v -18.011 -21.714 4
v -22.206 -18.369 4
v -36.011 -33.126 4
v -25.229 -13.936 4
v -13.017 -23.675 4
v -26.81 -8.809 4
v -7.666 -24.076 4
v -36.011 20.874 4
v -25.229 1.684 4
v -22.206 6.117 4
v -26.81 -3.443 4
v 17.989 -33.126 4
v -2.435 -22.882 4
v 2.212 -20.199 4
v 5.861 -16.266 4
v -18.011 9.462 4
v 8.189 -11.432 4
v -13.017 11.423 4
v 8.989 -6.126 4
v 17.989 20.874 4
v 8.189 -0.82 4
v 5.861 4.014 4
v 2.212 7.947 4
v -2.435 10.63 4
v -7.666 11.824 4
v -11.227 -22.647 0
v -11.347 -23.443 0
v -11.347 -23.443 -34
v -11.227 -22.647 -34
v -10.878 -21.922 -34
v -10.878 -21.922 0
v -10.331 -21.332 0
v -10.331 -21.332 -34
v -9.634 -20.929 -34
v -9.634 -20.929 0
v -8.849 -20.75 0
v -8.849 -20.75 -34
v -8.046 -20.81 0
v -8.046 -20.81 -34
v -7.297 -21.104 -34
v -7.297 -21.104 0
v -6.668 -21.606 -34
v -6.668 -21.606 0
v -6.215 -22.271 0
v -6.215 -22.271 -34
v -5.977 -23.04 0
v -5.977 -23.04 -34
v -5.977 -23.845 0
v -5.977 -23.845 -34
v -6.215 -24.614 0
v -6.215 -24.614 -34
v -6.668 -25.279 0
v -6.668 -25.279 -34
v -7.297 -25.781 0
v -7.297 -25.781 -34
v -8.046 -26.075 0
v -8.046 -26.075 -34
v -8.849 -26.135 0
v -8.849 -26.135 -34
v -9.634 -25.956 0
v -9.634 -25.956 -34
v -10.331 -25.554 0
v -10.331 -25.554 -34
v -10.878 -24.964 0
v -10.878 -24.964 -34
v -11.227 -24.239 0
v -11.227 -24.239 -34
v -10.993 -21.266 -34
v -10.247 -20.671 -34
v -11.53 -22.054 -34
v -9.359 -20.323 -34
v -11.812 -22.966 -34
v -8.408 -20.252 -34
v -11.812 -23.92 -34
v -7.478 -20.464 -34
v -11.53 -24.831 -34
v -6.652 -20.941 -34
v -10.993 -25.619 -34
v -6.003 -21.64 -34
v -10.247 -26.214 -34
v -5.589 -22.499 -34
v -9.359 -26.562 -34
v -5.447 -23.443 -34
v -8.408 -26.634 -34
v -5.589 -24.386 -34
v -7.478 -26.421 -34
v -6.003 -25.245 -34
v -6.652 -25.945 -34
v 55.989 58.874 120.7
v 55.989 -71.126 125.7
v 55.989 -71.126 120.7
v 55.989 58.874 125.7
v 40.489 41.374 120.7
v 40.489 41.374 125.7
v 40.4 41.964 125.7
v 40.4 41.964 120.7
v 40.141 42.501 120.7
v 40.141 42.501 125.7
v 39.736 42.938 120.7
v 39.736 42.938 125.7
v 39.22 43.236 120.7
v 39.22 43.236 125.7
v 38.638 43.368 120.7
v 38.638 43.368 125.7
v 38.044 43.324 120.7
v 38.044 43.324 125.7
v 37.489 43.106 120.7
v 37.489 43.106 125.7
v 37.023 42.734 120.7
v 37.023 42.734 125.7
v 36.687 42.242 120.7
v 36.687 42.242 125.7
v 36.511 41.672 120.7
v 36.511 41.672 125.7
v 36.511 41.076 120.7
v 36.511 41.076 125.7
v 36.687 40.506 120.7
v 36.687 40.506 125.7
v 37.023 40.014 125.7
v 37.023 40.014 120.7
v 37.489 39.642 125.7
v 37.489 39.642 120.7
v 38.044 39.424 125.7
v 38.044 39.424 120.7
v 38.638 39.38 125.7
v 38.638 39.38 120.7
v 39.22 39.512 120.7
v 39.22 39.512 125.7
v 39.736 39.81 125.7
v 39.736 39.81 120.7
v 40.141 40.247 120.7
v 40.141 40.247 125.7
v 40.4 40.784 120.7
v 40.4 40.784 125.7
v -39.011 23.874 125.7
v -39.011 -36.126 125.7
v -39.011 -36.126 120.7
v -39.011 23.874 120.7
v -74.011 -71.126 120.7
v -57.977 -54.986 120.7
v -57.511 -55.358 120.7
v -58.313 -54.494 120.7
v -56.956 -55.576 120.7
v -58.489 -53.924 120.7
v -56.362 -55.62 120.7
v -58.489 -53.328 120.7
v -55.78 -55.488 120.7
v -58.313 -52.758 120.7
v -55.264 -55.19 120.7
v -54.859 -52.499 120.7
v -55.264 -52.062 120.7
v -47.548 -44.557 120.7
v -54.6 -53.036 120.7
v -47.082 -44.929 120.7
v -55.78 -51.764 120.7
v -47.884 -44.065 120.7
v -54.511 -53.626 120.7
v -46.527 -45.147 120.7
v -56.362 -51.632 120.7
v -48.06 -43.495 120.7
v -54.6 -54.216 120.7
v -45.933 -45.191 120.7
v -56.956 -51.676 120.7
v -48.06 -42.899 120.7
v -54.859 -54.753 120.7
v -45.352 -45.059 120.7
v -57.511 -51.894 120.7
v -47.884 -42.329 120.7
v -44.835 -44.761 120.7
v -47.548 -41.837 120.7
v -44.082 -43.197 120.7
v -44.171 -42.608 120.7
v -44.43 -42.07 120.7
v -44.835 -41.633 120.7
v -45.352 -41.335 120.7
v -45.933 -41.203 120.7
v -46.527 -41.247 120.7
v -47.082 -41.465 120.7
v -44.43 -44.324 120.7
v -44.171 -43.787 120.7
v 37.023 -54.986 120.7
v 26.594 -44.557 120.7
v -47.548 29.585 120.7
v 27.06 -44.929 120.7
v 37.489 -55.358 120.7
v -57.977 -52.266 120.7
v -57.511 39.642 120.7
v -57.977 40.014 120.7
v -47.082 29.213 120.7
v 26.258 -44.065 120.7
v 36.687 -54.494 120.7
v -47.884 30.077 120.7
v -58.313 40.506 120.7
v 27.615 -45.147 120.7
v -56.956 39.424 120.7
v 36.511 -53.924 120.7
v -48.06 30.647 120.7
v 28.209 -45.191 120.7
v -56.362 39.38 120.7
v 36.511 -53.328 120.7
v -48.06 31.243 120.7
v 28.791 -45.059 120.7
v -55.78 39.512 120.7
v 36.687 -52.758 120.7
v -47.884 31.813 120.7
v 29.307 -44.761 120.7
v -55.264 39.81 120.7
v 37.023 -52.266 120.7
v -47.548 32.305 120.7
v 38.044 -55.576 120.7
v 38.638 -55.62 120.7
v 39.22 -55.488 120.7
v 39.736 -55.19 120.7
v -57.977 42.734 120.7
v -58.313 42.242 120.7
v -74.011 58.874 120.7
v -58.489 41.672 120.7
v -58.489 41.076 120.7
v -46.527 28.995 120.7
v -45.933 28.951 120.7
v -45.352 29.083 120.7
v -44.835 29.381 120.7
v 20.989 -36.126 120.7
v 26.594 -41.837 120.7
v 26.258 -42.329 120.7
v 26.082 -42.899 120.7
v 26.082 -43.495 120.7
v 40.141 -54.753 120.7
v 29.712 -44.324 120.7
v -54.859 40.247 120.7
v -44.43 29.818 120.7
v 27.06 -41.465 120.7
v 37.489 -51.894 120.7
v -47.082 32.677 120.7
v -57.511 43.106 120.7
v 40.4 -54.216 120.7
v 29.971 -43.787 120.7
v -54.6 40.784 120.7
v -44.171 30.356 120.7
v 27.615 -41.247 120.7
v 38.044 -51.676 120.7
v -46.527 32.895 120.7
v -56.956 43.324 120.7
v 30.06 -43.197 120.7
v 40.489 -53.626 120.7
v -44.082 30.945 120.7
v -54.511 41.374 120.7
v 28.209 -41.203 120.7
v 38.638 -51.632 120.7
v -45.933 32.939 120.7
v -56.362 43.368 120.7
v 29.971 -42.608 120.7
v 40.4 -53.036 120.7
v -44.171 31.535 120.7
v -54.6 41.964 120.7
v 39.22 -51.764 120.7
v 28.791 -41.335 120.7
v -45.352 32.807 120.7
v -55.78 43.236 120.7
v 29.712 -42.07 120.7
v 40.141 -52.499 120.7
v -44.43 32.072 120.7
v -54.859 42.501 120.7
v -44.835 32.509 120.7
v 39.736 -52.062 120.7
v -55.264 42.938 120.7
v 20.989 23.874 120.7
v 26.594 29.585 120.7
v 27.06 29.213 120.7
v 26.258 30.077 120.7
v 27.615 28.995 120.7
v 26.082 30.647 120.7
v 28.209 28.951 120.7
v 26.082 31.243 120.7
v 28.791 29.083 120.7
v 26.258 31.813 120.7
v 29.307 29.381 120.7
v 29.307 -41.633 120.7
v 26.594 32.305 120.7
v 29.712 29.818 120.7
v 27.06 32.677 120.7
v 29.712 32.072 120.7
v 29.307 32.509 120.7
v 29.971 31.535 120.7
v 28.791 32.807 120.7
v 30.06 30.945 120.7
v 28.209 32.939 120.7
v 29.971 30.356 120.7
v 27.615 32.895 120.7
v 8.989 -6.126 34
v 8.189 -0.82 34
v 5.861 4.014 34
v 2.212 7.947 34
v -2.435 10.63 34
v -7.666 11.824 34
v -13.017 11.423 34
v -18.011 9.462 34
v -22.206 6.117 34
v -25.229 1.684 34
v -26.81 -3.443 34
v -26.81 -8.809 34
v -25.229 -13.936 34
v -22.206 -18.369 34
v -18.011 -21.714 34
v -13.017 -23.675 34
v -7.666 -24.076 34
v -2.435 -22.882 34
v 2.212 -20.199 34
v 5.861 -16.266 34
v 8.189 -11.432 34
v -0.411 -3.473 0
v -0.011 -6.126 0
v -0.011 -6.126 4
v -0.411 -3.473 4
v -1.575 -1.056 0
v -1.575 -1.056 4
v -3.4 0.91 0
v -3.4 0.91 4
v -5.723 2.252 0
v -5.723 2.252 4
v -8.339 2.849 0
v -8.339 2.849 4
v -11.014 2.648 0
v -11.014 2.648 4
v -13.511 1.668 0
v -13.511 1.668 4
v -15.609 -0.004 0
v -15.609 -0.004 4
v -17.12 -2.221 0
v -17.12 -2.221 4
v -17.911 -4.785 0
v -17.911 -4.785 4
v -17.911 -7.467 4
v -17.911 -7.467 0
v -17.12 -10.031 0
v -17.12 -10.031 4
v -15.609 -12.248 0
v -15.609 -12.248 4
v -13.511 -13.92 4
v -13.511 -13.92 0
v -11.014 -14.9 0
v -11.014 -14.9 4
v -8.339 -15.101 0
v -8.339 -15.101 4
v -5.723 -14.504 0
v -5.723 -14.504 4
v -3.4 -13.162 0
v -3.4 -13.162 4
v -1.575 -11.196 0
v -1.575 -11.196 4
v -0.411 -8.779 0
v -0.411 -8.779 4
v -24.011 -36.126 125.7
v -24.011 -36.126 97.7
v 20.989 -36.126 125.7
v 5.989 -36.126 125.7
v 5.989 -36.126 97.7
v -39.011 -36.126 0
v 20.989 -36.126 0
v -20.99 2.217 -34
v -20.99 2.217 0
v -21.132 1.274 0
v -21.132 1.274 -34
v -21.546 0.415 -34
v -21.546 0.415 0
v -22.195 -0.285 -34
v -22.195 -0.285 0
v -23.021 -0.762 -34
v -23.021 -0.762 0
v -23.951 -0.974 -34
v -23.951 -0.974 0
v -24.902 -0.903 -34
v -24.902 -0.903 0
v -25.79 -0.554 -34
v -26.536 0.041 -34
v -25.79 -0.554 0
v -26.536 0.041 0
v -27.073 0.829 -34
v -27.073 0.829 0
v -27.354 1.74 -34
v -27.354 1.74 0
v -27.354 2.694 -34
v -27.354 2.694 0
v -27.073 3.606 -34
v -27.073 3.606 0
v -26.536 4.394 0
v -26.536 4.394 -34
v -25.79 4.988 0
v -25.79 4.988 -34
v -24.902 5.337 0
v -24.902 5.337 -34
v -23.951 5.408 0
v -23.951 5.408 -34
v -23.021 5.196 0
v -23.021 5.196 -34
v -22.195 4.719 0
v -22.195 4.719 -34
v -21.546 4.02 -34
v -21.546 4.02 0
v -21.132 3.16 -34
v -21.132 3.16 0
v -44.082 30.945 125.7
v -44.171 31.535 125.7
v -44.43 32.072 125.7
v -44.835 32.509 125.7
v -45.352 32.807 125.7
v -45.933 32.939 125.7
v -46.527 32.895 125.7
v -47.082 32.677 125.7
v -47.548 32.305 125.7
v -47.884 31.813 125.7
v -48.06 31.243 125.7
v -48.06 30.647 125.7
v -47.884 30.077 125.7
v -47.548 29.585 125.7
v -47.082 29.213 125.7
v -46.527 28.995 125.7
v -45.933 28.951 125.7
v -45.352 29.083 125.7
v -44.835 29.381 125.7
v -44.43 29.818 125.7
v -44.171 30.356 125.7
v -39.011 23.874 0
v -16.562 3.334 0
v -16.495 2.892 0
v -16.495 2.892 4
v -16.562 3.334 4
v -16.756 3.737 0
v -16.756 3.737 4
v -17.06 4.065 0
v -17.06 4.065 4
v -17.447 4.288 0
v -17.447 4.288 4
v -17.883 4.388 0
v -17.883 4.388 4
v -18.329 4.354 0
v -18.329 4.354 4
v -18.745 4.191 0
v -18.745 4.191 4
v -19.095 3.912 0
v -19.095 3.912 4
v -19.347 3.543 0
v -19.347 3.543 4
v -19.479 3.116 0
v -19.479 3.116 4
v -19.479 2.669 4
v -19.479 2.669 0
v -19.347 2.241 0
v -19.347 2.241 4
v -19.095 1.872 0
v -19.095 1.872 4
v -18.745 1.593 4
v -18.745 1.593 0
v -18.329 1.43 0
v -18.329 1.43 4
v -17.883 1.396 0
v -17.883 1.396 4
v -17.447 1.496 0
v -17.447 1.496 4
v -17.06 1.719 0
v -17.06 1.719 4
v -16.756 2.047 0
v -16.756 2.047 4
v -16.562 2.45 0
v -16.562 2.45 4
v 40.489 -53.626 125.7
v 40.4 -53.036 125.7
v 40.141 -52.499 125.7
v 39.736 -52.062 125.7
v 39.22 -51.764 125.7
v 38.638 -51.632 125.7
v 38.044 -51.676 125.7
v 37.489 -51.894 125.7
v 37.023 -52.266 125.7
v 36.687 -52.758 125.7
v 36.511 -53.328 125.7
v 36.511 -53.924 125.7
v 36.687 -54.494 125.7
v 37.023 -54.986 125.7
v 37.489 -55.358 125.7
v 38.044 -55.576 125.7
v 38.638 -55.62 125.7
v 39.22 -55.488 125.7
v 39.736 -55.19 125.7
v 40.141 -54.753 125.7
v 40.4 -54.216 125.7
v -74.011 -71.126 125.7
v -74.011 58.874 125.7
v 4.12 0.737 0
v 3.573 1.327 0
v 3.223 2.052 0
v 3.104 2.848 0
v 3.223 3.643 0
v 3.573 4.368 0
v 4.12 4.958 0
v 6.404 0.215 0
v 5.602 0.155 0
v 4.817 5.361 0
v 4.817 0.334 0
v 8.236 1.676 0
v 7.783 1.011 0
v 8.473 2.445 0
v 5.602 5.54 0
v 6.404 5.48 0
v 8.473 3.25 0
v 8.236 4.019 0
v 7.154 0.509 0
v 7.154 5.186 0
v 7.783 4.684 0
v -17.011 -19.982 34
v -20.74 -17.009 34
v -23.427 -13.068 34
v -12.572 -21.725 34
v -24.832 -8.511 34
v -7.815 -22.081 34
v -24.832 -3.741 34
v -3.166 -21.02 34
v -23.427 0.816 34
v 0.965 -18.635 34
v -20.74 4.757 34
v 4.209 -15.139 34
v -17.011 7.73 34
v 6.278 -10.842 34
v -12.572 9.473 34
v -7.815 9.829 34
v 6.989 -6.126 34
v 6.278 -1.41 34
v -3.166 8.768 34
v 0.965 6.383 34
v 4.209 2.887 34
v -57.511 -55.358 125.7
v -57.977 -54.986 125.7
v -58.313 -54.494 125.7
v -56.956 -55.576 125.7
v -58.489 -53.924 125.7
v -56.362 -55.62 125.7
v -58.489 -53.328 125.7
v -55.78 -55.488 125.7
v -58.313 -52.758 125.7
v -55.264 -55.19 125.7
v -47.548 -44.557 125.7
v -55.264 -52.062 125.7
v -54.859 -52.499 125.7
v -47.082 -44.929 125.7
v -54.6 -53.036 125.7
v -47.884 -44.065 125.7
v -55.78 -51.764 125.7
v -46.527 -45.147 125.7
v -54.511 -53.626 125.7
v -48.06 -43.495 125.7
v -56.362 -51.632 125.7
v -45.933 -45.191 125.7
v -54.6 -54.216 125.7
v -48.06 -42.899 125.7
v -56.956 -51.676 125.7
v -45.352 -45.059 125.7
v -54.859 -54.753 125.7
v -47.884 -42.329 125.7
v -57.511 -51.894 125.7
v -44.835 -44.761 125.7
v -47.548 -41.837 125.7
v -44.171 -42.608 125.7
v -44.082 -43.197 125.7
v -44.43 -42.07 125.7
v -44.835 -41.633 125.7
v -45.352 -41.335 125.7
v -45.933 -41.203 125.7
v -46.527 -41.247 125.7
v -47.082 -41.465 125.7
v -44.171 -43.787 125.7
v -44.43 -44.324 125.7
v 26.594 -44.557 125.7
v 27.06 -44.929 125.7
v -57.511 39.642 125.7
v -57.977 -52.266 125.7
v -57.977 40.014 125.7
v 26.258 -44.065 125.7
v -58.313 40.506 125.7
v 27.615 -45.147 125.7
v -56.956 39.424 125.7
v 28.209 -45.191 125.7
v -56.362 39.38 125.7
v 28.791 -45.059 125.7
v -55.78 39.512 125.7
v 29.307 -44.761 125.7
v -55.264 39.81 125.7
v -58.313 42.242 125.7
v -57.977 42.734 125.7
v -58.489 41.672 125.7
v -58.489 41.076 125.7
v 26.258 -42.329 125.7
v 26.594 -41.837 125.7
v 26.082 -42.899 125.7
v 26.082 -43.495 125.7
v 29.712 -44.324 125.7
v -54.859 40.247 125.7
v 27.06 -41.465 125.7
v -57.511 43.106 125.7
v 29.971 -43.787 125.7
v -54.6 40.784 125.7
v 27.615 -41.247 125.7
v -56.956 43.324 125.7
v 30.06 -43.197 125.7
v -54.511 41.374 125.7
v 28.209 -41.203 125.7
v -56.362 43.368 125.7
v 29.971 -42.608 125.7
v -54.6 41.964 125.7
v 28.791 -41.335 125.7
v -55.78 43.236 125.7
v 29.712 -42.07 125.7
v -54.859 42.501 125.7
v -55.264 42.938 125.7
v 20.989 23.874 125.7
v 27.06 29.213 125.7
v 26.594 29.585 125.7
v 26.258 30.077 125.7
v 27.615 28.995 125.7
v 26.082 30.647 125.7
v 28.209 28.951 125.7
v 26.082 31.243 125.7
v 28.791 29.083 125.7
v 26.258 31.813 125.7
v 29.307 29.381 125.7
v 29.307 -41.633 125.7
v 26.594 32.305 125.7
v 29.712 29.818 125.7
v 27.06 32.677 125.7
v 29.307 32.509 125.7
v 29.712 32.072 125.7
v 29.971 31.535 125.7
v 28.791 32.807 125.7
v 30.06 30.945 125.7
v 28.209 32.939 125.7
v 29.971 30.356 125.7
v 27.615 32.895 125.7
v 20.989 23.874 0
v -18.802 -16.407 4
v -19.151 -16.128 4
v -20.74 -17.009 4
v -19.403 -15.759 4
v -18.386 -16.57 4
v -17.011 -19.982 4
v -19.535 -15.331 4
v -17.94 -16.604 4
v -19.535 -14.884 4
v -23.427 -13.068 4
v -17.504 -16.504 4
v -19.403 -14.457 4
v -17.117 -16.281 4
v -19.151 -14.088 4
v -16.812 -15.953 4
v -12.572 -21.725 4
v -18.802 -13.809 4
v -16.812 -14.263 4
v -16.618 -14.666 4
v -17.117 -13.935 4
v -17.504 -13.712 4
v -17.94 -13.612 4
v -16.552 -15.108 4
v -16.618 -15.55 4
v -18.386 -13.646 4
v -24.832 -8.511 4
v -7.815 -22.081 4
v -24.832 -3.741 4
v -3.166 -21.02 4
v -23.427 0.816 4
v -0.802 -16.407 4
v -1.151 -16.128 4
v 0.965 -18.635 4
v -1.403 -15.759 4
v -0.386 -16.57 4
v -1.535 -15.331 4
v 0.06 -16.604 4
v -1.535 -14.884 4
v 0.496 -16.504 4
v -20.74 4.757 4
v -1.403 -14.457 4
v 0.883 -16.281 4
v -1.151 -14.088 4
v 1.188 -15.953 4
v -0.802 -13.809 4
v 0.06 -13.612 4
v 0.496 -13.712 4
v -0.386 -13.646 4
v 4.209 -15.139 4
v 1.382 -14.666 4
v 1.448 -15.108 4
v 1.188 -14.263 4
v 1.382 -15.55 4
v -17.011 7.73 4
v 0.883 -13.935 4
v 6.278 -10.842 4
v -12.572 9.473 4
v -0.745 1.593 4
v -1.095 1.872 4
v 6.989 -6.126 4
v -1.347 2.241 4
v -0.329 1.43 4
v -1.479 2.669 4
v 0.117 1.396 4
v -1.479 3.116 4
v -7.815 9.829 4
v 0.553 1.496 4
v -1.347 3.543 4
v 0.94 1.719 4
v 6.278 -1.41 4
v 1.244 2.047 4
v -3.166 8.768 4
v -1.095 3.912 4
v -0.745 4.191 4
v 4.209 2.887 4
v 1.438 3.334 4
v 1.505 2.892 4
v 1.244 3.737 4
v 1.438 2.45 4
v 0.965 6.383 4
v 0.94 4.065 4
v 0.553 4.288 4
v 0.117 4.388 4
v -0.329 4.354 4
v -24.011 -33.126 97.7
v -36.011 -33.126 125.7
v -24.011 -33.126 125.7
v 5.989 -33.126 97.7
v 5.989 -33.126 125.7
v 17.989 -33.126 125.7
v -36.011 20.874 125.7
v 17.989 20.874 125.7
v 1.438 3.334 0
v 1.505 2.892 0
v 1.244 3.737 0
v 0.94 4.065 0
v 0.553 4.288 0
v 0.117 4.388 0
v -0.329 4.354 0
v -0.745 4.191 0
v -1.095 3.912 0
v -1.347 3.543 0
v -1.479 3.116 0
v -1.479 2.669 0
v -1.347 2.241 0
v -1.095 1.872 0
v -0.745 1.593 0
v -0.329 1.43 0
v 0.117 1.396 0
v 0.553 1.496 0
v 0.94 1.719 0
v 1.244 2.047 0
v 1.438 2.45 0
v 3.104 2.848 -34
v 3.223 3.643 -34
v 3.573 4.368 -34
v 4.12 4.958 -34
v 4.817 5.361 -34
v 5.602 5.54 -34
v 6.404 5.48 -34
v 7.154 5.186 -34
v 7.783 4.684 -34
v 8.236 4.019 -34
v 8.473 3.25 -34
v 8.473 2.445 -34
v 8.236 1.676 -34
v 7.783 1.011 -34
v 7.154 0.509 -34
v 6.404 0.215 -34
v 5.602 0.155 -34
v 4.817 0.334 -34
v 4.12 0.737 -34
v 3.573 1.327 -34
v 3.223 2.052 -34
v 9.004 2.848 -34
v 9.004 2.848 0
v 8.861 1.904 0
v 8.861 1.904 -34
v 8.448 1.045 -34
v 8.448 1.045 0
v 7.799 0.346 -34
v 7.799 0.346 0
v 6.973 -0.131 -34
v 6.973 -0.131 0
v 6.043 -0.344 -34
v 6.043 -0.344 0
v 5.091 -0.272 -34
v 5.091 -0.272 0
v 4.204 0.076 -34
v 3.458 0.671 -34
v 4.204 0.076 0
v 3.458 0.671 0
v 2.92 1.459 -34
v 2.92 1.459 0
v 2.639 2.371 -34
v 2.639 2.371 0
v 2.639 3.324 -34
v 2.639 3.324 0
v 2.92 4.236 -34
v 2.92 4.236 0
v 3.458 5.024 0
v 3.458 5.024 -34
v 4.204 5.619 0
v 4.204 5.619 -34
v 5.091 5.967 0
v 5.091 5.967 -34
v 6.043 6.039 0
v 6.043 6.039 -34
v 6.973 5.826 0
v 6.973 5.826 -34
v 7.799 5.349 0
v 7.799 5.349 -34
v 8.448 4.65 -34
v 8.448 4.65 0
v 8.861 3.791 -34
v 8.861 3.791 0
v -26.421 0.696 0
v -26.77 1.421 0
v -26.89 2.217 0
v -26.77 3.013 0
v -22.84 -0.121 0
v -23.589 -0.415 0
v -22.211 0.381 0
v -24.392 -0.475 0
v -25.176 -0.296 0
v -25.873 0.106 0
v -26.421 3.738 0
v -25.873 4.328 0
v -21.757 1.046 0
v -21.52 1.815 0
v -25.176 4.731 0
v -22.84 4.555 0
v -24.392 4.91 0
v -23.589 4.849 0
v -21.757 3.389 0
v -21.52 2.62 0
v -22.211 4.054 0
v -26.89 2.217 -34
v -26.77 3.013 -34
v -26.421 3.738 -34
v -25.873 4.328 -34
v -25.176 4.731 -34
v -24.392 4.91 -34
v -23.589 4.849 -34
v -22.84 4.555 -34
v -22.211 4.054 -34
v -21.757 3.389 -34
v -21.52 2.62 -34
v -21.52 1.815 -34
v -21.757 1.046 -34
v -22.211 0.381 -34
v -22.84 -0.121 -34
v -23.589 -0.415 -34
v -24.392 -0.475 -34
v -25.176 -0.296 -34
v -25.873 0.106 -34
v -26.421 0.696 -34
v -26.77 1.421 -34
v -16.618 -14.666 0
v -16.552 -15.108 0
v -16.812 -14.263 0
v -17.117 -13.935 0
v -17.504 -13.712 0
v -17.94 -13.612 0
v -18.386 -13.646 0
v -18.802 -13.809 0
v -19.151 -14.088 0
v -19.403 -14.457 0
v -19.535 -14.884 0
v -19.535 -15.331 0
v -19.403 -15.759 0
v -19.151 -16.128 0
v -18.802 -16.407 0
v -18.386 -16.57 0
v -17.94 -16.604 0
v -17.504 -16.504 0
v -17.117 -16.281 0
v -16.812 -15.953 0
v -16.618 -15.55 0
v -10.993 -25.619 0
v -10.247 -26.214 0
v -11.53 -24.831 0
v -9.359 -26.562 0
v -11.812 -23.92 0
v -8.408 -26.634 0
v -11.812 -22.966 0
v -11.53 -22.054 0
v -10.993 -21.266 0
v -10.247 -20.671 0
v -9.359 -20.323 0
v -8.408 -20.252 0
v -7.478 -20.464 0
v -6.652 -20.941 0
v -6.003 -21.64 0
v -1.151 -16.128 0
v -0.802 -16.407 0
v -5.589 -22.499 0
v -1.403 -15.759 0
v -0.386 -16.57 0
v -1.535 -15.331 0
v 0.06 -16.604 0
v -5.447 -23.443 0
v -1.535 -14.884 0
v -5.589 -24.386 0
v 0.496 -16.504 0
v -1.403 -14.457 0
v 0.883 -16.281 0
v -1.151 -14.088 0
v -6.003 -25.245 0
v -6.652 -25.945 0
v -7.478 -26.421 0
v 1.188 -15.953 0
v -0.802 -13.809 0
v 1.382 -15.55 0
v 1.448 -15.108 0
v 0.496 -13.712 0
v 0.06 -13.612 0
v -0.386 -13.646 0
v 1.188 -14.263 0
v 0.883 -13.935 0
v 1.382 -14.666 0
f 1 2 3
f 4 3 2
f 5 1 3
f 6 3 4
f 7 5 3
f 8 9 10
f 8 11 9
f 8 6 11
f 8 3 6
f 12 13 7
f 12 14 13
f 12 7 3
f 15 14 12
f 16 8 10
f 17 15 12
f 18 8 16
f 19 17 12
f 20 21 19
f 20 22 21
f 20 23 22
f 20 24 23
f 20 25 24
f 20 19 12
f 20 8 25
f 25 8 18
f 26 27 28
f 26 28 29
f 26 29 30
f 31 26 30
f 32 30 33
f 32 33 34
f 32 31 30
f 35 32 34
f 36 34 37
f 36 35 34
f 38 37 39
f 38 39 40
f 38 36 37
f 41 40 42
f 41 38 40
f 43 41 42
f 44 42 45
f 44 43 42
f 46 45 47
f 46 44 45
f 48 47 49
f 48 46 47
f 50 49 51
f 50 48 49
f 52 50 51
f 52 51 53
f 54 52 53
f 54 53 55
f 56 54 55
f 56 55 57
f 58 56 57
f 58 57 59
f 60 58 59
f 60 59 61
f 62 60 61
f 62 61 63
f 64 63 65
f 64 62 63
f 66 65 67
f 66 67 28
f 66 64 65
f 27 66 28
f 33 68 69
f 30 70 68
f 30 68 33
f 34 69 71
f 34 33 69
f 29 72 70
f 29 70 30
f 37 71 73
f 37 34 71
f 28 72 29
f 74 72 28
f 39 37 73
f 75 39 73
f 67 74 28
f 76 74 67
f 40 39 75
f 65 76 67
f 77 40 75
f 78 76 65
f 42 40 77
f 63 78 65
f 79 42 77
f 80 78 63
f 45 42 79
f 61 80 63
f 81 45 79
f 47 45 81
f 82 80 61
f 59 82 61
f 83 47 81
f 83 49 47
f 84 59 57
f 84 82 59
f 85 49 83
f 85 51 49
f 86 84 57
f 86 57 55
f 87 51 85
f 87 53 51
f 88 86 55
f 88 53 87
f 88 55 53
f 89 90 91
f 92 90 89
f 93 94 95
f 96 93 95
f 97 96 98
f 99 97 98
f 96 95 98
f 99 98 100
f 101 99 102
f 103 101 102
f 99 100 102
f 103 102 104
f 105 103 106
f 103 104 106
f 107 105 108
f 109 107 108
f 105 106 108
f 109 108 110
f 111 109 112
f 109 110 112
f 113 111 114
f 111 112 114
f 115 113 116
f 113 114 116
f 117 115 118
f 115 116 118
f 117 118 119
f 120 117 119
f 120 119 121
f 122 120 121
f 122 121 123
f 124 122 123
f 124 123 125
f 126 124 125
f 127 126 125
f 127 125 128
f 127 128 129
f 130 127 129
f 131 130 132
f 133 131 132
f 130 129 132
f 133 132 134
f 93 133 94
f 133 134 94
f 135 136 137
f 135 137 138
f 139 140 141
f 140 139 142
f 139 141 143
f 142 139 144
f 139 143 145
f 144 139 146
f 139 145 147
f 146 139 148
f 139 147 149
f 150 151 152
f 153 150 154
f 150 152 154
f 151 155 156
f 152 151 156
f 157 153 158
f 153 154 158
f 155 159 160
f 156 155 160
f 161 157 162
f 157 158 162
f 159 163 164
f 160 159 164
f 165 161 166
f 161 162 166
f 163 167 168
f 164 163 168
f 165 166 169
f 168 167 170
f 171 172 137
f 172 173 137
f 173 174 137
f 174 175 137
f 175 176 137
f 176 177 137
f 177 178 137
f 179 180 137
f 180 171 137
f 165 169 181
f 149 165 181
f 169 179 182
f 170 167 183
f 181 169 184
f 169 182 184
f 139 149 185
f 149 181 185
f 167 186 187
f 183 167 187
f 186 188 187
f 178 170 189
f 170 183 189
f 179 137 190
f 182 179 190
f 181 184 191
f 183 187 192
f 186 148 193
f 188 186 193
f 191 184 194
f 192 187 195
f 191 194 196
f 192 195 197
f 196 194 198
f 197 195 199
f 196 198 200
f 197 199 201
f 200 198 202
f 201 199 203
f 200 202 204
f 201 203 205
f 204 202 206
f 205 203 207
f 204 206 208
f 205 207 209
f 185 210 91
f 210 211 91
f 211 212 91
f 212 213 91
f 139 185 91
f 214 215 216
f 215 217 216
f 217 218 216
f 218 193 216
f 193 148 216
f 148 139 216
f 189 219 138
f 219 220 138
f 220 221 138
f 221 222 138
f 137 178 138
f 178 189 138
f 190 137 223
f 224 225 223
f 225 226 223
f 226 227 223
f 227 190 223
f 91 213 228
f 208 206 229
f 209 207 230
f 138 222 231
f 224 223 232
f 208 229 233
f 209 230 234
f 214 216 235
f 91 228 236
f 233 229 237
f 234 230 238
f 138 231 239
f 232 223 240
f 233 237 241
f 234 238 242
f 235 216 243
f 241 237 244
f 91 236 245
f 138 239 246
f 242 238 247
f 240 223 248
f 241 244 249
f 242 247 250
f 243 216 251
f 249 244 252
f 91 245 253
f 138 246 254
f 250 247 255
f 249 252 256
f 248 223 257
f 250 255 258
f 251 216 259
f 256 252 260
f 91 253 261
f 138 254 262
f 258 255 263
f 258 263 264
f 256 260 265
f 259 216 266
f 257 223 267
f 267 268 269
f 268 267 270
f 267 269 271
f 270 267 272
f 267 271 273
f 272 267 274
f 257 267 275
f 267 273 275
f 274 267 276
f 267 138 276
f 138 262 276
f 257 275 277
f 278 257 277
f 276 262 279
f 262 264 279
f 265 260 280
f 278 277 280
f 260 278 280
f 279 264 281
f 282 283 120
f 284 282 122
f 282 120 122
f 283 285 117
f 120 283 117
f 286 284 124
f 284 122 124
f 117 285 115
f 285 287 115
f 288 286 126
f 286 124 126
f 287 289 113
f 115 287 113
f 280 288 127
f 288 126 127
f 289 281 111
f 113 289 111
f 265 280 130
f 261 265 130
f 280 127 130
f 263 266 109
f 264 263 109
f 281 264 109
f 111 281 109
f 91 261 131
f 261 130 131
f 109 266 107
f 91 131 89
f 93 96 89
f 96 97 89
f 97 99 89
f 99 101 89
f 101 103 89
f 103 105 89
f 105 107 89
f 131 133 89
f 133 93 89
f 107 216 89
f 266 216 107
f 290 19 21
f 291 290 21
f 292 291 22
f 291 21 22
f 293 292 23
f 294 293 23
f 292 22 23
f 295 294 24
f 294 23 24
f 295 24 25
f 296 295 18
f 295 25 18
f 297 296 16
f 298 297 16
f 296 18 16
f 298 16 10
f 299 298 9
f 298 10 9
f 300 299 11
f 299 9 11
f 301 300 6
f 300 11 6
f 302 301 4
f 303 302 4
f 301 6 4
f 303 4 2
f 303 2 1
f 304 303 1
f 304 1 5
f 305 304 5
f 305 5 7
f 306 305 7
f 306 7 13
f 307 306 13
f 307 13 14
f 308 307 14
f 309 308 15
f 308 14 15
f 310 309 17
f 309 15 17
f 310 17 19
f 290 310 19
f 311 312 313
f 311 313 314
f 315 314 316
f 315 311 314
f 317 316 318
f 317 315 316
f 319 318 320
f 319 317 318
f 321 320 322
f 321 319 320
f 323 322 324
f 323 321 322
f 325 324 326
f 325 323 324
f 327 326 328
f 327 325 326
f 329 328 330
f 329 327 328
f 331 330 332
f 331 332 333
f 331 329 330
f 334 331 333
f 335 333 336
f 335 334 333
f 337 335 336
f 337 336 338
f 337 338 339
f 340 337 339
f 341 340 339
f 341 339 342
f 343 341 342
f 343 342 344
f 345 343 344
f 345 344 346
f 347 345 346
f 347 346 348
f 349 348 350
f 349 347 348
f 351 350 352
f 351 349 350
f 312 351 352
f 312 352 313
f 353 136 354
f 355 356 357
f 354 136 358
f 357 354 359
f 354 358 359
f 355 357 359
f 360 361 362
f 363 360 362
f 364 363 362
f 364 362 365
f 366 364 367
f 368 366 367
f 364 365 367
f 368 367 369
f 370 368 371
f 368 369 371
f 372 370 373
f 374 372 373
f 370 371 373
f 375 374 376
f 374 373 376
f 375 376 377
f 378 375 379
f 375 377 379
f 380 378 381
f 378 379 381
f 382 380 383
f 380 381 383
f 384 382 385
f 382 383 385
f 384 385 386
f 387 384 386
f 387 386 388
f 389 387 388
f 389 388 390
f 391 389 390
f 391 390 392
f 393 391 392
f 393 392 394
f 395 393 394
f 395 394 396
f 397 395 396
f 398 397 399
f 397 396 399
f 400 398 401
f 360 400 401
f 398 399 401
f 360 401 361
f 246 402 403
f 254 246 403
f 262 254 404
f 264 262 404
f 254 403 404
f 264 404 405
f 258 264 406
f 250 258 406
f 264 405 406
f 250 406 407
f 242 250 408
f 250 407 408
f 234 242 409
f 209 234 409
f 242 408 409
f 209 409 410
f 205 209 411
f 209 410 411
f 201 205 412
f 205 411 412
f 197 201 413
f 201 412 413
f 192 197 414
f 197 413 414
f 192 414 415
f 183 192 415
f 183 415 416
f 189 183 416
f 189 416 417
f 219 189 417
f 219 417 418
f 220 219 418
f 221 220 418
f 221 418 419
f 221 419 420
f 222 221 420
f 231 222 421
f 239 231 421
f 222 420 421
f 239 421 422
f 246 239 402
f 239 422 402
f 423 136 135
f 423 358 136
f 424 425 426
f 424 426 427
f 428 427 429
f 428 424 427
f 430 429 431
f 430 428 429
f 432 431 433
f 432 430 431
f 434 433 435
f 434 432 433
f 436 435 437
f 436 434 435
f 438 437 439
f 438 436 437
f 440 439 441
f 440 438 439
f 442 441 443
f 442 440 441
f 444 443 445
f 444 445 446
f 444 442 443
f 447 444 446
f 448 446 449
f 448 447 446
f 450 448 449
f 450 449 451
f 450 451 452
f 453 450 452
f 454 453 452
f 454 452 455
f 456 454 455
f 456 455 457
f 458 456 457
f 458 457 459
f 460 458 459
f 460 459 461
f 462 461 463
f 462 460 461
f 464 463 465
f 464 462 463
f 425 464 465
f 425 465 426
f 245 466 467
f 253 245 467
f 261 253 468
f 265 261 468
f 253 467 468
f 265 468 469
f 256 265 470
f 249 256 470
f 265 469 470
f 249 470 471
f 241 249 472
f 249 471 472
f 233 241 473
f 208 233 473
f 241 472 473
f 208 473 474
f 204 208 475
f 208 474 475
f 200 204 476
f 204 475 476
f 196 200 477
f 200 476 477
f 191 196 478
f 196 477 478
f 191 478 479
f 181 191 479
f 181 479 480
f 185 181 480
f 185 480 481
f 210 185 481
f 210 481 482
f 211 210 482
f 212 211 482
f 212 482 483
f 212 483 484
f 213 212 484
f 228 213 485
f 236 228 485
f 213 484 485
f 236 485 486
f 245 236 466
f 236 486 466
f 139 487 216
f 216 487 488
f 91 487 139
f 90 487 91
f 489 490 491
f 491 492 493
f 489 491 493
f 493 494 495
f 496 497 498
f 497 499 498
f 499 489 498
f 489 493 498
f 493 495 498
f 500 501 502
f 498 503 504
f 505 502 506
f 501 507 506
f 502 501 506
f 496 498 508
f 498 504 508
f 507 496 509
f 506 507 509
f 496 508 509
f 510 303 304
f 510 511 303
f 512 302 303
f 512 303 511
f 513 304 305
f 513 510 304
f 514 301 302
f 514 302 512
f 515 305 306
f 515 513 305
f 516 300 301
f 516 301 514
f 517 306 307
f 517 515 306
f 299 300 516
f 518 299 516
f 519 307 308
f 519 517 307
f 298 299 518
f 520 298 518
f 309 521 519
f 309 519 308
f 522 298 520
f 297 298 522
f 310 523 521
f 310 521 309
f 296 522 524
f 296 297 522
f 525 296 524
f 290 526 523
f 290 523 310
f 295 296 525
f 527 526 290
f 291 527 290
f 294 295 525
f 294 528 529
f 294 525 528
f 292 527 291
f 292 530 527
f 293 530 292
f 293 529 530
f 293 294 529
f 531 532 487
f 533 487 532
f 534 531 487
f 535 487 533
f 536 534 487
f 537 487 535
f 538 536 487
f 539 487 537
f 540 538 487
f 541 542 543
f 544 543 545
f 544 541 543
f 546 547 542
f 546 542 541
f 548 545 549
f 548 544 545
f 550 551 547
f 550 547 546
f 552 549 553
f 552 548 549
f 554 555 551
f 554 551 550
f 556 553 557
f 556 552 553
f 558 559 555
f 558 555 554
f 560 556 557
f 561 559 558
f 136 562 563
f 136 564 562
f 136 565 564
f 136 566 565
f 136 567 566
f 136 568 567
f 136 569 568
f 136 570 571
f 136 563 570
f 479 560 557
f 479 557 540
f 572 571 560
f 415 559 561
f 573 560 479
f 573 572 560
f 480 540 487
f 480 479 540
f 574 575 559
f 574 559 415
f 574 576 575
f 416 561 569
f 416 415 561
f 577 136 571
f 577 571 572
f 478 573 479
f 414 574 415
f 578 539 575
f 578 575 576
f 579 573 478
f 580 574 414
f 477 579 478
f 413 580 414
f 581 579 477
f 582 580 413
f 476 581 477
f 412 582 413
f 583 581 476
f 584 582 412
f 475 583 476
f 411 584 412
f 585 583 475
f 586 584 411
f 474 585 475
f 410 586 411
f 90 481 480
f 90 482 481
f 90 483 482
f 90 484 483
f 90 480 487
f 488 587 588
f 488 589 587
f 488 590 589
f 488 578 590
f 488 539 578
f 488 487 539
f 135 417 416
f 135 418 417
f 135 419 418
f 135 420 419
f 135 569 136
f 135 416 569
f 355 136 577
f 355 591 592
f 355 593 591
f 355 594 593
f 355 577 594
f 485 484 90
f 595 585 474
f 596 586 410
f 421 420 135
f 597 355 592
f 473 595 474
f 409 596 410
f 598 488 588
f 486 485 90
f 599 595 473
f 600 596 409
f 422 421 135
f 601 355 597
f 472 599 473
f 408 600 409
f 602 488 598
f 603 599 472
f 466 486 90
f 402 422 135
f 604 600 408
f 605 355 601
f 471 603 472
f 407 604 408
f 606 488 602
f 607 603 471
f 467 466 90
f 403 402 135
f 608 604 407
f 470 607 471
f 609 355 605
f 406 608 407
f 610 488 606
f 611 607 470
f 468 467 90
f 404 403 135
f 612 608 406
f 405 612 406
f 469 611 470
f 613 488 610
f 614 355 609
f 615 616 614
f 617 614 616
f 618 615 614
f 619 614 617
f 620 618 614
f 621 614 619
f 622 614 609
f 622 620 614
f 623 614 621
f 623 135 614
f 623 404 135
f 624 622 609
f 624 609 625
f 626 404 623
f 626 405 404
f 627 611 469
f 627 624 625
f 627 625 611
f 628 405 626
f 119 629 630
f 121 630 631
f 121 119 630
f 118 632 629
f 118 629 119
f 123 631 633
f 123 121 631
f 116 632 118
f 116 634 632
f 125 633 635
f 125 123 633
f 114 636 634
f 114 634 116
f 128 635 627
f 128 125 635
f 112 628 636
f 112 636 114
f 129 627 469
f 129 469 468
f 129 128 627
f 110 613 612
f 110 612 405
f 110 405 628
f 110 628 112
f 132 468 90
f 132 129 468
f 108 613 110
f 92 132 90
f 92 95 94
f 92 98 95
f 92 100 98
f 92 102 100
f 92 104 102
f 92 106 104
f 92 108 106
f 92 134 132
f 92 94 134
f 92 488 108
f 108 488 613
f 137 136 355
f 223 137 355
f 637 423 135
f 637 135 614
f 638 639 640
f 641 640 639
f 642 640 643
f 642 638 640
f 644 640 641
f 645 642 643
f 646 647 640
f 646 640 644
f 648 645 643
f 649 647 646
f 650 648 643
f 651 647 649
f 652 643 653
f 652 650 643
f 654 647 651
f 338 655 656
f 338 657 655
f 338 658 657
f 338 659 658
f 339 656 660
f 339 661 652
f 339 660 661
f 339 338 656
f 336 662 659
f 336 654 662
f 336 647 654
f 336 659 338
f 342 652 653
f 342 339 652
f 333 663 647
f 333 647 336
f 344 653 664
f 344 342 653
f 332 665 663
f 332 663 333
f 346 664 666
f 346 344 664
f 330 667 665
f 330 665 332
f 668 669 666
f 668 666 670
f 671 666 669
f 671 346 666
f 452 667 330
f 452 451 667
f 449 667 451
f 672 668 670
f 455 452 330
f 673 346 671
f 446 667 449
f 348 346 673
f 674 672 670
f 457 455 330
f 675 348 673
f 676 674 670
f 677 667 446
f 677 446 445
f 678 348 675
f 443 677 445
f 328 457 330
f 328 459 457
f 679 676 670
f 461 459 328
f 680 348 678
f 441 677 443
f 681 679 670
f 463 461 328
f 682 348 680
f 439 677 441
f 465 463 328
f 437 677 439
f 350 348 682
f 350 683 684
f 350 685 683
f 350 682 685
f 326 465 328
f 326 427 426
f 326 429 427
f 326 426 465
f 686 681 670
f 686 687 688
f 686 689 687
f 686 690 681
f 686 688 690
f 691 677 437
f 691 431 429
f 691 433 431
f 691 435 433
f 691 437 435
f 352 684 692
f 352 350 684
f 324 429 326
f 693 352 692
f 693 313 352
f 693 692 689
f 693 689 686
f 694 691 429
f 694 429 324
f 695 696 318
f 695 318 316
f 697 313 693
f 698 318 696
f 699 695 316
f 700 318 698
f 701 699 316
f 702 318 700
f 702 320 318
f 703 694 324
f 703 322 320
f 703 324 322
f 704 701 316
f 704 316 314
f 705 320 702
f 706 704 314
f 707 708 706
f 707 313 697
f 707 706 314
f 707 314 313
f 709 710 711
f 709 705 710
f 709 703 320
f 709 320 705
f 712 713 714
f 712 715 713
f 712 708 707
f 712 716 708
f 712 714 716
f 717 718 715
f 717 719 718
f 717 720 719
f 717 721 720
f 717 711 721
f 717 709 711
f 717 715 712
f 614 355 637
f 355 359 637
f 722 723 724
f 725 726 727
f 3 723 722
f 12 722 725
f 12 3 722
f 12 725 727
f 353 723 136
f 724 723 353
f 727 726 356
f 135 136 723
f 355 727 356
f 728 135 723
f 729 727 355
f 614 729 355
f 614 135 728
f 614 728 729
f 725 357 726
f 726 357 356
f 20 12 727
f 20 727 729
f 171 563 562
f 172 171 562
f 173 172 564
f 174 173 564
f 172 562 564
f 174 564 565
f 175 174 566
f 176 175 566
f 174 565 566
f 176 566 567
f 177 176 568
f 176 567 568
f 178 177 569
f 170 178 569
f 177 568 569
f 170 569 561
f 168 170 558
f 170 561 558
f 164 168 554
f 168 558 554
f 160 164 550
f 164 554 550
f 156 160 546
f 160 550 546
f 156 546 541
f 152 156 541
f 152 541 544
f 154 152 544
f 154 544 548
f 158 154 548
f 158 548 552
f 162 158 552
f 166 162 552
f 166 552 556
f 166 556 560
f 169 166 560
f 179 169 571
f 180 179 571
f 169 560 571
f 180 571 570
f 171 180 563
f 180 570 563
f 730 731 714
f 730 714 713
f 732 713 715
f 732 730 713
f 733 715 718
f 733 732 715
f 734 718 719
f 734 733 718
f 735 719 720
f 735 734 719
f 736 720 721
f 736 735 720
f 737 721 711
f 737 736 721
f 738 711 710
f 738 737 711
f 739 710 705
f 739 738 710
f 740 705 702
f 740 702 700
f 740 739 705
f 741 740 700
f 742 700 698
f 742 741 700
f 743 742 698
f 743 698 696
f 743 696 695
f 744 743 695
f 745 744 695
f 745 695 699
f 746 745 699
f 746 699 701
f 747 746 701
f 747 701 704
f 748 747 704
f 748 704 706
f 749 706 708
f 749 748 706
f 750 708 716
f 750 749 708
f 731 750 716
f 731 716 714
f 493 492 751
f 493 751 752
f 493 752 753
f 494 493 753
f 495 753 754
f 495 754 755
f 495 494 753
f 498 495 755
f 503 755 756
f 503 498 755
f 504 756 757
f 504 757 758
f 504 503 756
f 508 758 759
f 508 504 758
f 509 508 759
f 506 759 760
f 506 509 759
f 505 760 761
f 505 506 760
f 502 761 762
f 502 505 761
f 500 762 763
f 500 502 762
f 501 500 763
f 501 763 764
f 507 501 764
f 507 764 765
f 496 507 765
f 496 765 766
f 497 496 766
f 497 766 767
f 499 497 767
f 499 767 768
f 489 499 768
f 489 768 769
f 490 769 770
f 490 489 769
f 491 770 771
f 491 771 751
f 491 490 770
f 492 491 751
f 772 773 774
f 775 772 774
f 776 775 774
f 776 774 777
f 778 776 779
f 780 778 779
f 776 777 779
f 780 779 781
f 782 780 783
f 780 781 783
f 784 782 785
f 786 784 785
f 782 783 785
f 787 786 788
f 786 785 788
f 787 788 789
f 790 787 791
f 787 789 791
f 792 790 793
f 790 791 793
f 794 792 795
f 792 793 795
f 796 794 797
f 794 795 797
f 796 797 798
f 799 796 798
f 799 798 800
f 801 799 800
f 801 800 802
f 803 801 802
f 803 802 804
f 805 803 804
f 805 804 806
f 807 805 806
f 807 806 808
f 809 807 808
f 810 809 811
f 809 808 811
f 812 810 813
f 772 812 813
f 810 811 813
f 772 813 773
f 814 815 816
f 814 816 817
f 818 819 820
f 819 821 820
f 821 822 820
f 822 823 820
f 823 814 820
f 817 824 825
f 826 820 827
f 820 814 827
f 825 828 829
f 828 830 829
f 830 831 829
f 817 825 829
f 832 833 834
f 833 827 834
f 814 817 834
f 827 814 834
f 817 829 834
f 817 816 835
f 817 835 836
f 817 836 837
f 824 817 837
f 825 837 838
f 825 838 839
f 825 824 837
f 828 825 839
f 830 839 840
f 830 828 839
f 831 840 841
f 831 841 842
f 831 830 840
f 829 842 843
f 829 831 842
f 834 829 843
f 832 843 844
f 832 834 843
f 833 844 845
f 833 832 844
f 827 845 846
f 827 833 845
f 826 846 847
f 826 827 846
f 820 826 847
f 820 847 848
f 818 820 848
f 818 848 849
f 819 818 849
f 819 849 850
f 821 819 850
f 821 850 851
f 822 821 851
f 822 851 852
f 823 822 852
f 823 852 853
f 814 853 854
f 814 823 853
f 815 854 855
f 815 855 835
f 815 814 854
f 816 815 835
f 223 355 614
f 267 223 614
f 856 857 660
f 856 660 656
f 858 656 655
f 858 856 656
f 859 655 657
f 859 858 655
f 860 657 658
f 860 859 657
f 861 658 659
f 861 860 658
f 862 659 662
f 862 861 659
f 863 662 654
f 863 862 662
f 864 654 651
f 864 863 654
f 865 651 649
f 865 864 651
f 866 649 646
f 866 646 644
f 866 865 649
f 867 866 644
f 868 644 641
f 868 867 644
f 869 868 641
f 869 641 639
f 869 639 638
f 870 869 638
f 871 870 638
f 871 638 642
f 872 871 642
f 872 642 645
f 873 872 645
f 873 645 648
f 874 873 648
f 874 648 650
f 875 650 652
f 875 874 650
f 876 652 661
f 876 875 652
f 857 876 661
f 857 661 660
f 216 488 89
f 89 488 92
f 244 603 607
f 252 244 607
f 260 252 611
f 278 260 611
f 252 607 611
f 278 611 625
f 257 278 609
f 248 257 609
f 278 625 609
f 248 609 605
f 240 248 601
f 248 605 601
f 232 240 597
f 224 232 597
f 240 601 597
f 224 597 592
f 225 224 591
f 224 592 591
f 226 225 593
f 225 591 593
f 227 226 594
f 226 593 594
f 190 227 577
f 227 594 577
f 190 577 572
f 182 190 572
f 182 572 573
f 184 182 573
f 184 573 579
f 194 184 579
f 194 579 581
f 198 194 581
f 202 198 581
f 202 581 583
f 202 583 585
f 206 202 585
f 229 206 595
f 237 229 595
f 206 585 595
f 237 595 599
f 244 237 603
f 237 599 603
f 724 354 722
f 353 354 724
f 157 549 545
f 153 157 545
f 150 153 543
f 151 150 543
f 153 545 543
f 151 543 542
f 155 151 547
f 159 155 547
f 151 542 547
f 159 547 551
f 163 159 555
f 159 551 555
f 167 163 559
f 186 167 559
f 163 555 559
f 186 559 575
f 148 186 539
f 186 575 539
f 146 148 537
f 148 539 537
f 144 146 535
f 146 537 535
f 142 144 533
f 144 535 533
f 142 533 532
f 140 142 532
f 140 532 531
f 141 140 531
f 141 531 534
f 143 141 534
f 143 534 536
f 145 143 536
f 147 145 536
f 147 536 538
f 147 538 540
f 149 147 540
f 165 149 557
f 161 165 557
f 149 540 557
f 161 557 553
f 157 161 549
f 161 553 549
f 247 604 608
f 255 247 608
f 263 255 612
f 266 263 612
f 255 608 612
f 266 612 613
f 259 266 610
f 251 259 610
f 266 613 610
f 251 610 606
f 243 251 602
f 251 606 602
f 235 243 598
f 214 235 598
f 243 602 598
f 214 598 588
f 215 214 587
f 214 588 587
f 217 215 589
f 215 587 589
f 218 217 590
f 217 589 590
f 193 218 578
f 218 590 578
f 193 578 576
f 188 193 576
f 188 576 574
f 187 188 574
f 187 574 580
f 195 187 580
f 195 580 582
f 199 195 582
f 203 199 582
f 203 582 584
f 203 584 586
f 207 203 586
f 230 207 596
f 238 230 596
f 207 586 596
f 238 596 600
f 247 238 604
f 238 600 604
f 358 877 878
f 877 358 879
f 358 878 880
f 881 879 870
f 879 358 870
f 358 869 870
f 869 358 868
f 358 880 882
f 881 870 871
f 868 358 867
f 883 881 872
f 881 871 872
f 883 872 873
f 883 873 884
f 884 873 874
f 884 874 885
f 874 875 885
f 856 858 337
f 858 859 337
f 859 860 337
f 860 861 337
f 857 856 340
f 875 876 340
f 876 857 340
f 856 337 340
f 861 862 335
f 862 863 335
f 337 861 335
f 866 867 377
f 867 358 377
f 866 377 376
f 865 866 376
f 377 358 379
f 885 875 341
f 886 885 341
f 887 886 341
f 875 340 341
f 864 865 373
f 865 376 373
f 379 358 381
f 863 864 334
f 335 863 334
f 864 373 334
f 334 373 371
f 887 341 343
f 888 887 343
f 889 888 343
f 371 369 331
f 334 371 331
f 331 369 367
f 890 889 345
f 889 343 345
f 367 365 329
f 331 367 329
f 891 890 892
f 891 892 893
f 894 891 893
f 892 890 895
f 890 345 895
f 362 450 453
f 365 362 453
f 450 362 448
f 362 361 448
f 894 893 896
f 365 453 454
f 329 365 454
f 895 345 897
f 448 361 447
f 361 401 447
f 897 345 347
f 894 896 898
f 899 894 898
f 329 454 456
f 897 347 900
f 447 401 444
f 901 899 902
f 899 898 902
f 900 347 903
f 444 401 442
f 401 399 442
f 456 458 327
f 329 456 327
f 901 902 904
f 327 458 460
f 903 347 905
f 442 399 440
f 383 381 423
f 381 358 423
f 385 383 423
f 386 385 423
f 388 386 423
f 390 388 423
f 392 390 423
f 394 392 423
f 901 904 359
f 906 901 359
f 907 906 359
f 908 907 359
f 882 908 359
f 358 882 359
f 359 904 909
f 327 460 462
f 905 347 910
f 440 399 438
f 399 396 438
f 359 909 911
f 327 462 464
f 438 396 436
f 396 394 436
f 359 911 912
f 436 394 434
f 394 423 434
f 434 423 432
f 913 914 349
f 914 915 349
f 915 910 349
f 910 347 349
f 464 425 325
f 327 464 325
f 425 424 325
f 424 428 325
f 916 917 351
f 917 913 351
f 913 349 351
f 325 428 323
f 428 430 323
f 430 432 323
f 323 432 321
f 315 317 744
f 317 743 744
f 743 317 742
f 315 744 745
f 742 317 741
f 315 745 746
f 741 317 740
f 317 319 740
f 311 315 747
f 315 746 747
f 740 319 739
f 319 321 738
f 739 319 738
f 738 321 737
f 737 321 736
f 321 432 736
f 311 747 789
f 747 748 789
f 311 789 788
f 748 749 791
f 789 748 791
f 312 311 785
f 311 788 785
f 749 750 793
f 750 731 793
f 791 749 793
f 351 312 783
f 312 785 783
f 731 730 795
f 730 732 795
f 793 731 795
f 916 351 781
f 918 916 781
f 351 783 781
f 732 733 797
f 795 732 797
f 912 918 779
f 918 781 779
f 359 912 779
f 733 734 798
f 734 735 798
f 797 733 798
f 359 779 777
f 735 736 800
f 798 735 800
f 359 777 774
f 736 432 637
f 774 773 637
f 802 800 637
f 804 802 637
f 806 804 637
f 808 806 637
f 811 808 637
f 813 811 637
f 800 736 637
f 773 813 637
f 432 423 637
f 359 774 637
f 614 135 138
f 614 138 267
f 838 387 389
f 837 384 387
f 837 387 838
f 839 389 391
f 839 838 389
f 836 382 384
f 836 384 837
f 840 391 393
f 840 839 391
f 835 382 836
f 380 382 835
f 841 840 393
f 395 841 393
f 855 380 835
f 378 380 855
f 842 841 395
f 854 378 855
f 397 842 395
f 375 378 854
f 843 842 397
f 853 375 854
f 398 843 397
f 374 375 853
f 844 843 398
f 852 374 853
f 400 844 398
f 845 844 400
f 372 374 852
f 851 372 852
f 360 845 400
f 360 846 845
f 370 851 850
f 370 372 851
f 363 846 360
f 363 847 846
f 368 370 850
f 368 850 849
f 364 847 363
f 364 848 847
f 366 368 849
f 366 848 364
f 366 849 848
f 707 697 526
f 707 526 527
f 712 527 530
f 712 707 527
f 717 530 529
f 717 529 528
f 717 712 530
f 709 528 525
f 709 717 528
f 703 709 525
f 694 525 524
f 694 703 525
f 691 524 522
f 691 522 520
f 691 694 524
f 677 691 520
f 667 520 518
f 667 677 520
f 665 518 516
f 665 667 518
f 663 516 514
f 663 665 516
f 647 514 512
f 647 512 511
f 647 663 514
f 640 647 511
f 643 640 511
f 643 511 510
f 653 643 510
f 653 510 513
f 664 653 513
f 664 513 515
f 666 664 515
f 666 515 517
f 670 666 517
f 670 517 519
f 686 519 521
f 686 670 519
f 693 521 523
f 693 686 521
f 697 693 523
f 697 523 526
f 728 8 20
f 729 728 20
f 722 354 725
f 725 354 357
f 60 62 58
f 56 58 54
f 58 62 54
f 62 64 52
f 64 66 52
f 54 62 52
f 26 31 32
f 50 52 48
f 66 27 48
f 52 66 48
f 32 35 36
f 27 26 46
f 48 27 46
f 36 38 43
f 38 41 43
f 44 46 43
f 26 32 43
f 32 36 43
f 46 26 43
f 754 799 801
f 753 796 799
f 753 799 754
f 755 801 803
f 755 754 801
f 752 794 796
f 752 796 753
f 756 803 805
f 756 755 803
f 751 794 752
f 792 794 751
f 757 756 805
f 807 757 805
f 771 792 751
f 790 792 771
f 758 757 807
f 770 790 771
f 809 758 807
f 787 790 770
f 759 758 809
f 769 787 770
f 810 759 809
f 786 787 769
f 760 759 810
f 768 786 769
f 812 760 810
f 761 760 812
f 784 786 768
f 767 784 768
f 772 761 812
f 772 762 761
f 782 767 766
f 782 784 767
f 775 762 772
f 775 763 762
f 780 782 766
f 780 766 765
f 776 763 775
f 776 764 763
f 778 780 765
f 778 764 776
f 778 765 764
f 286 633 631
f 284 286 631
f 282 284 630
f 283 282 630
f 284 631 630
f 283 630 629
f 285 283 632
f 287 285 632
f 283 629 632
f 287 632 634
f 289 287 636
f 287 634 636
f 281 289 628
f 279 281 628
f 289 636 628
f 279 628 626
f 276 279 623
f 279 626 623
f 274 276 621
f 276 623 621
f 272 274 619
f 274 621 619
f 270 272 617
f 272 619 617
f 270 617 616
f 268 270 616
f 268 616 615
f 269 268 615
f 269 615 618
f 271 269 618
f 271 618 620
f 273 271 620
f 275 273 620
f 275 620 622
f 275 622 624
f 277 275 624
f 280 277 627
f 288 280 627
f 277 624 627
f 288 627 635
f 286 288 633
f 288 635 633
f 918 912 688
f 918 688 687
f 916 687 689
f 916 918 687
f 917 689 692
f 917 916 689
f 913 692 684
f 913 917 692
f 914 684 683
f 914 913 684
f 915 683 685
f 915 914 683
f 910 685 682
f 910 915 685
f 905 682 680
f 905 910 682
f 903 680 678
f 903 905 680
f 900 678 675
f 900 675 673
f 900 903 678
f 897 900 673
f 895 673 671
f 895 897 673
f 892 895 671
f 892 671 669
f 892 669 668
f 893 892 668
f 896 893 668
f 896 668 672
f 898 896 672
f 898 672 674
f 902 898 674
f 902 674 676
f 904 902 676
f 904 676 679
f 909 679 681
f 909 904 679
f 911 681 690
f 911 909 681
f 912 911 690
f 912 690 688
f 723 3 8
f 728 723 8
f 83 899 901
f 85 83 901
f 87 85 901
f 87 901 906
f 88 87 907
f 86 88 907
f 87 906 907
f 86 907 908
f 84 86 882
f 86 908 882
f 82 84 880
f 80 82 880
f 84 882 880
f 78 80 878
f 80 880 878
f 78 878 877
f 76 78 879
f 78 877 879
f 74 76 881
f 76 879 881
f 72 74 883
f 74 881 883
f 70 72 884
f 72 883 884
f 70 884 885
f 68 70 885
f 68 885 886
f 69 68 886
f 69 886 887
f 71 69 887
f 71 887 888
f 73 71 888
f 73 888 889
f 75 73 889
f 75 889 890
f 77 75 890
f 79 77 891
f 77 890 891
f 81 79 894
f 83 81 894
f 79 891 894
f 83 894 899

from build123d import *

# Parameters (mm, degrees)
SKETCH1_W           = 60
SKETCH1_H           = 60
SKETCH1_R           = 9
SKETCH1_R_2         = 1.5
BOSS_EXTRUDE1_DEPTH = 4
SKETCH2_R           = 18
SKETCH2_R_2         = 16
BOSS_EXTRUDE2_DEPTH = 30
SKETCH4_R           = 3.2
SKETCH4_R_2         = 2.7
BOSS_EXTRUDE6_DEPTH = 34
SKETCH5_W           = 60
SKETCH5_H           = 60
SKETCH5_W_2         = 54
SKETCH5_H_2         = 54
BOSS_EXTRUDE7_DEPTH = 121.7
SKETCH7_W           = 30
SKETCH7_H           = 28
CUT_EXTRUDE1_DEPTH  = 30.7
SKETCH8_W           = 130
SKETCH8_H           = 130
SKETCH8_R           = 2
SKETCH8_W_2         = 60
SKETCH8_H_2         = 60
BOSS_EXTRUDE8_DEPTH = 5


with BuildPart() as part:
    # Sketch1 → Boss-Extrude1 (new body)
    with BuildSketch(Plane.XY):
        with Locations((-9.011180766, -6.125993037)):
            Rectangle(SKETCH1_W, SKETCH1_H)
        with Locations((-9.011180766, -6.125993037)):
            Circle(SKETCH1_R, mode=Mode.SUBTRACT)
        with Locations((-17.995470725, 2.892105033)):
            Circle(SKETCH1_R_2, mode=Mode.SUBTRACT)
        with Locations((-18.051854011, -15.107894967)):
            Circle(SKETCH1_R_2, mode=Mode.SUBTRACT)
        with Locations((0.004529275, 2.892105033)):
            Circle(SKETCH1_R_2, mode=Mode.SUBTRACT)
        with Locations((-0.051854011, -15.107894967)):
            Circle(SKETCH1_R_2, mode=Mode.SUBTRACT)
    extrude(amount=BOSS_EXTRUDE1_DEPTH)

    # Sketch2 → Boss-Extrude2 (add)
    with BuildSketch(Plane.XY.offset(4)):
        with Locations((-9.011180766, -6.125993037)):
            Circle(SKETCH2_R)
        with Locations((-9.011180766, -6.125993037)):
            Circle(SKETCH2_R_2, mode=Mode.SUBTRACT)
    extrude(amount=BOSS_EXTRUDE2_DEPTH)

    # Sketch4 → Boss-Extrude6 (add)
    # profile 1 of 3: a face of its own
    with BuildSketch(Plane(origin=(0, 0, 0), x_dir=(-1, 0, 0), z_dir=(0, 0, -1))):
        with Locations(Location((-5.803539584, 2.84752695, 0), (0, 0, 180))):
            Circle(SKETCH4_R)
        with Locations((-5.803539584, 2.84752695)):
            Circle(SKETCH4_R_2, mode=Mode.SUBTRACT)
    # profile 2 of 3: a face of its own
    with BuildSketch(Plane(origin=(0, 0, 0), x_dir=(-1, 0, 0), z_dir=(0, 0, -1))):
        with Locations(Location((24.189837211, 2.217171142, 0), (0, 0, 180))):
            Circle(SKETCH4_R)
        with Locations((24.189837211, 2.217171142)):
            Circle(SKETCH4_R_2, mode=Mode.SUBTRACT)
    # profile 3 of 3: a face of its own
    with BuildSketch(Plane(origin=(0, 0, 0), x_dir=(-1, 0, 0), z_dir=(0, 0, -1))):
        with Locations(Location((8.64724467, -23.442677204, 0), (0, 0, 180))):
            Circle(SKETCH4_R)
        with Locations((8.64724467, -23.442677204)):
            Circle(SKETCH4_R_2, mode=Mode.SUBTRACT)
    extrude(amount=BOSS_EXTRUDE6_DEPTH)

    # Sketch5 → Boss-Extrude7 (add)
    with BuildSketch(Plane.XY.offset(4)):
        with Locations((-9.011180766, -6.125993037)):
            Rectangle(SKETCH5_W, SKETCH5_H)
        with Locations((-9.011180766, -6.125993037)):
            Rectangle(SKETCH5_W_2, SKETCH5_H_2, mode=Mode.SUBTRACT)
    extrude(amount=BOSS_EXTRUDE7_DEPTH)

    # Sketch7 → Cut-Extrude1 (cut)
    with BuildSketch(Plane.XZ.offset(36.125993037)):
        with Locations((-9.011180766, 111.7)):
            Rectangle(SKETCH7_W, SKETCH7_H)
    extrude(amount=-CUT_EXTRUDE1_DEPTH, mode=Mode.SUBTRACT)


with BuildPart() as body_2:
    # Sketch8 → Boss-Extrude8 (new body)
    with BuildSketch(Plane.XY.offset(125.7)):
        with Locations((-9.011180766, -6.125993037)):
            Rectangle(SKETCH8_W, SKETCH8_H)
        with Locations((-56.511180766, 41.374006963)):
            Circle(SKETCH8_R, mode=Mode.SUBTRACT)
        with Locations((-46.082248578, 30.945074775)):
            Circle(SKETCH8_R, mode=Mode.SUBTRACT)
        with Locations((-9.011180766, -6.125993037)):
            Rectangle(SKETCH8_W_2, SKETCH8_H_2, mode=Mode.SUBTRACT)
        with Locations((28.059887046, -43.197060849)):
            Circle(SKETCH8_R, mode=Mode.SUBTRACT)
        with Locations((38.488819234, -53.625993037)):
            Circle(SKETCH8_R, mode=Mode.SUBTRACT)
        with Locations((-56.511180766, -53.625993037)):
            Circle(SKETCH8_R, mode=Mode.SUBTRACT)
        with Locations((-46.082248578, -43.197060849)):
            Circle(SKETCH8_R, mode=Mode.SUBTRACT)
        with Locations((28.059887046, 30.945074775)):
            Circle(SKETCH8_R, mode=Mode.SUBTRACT)
        with Locations((38.488819234, 41.374006963)):
            Circle(SKETCH8_R, mode=Mode.SUBTRACT)
    extrude(amount=-BOSS_EXTRUDE8_DEPTH)


solid = Compound([part.part, body_2.part])
